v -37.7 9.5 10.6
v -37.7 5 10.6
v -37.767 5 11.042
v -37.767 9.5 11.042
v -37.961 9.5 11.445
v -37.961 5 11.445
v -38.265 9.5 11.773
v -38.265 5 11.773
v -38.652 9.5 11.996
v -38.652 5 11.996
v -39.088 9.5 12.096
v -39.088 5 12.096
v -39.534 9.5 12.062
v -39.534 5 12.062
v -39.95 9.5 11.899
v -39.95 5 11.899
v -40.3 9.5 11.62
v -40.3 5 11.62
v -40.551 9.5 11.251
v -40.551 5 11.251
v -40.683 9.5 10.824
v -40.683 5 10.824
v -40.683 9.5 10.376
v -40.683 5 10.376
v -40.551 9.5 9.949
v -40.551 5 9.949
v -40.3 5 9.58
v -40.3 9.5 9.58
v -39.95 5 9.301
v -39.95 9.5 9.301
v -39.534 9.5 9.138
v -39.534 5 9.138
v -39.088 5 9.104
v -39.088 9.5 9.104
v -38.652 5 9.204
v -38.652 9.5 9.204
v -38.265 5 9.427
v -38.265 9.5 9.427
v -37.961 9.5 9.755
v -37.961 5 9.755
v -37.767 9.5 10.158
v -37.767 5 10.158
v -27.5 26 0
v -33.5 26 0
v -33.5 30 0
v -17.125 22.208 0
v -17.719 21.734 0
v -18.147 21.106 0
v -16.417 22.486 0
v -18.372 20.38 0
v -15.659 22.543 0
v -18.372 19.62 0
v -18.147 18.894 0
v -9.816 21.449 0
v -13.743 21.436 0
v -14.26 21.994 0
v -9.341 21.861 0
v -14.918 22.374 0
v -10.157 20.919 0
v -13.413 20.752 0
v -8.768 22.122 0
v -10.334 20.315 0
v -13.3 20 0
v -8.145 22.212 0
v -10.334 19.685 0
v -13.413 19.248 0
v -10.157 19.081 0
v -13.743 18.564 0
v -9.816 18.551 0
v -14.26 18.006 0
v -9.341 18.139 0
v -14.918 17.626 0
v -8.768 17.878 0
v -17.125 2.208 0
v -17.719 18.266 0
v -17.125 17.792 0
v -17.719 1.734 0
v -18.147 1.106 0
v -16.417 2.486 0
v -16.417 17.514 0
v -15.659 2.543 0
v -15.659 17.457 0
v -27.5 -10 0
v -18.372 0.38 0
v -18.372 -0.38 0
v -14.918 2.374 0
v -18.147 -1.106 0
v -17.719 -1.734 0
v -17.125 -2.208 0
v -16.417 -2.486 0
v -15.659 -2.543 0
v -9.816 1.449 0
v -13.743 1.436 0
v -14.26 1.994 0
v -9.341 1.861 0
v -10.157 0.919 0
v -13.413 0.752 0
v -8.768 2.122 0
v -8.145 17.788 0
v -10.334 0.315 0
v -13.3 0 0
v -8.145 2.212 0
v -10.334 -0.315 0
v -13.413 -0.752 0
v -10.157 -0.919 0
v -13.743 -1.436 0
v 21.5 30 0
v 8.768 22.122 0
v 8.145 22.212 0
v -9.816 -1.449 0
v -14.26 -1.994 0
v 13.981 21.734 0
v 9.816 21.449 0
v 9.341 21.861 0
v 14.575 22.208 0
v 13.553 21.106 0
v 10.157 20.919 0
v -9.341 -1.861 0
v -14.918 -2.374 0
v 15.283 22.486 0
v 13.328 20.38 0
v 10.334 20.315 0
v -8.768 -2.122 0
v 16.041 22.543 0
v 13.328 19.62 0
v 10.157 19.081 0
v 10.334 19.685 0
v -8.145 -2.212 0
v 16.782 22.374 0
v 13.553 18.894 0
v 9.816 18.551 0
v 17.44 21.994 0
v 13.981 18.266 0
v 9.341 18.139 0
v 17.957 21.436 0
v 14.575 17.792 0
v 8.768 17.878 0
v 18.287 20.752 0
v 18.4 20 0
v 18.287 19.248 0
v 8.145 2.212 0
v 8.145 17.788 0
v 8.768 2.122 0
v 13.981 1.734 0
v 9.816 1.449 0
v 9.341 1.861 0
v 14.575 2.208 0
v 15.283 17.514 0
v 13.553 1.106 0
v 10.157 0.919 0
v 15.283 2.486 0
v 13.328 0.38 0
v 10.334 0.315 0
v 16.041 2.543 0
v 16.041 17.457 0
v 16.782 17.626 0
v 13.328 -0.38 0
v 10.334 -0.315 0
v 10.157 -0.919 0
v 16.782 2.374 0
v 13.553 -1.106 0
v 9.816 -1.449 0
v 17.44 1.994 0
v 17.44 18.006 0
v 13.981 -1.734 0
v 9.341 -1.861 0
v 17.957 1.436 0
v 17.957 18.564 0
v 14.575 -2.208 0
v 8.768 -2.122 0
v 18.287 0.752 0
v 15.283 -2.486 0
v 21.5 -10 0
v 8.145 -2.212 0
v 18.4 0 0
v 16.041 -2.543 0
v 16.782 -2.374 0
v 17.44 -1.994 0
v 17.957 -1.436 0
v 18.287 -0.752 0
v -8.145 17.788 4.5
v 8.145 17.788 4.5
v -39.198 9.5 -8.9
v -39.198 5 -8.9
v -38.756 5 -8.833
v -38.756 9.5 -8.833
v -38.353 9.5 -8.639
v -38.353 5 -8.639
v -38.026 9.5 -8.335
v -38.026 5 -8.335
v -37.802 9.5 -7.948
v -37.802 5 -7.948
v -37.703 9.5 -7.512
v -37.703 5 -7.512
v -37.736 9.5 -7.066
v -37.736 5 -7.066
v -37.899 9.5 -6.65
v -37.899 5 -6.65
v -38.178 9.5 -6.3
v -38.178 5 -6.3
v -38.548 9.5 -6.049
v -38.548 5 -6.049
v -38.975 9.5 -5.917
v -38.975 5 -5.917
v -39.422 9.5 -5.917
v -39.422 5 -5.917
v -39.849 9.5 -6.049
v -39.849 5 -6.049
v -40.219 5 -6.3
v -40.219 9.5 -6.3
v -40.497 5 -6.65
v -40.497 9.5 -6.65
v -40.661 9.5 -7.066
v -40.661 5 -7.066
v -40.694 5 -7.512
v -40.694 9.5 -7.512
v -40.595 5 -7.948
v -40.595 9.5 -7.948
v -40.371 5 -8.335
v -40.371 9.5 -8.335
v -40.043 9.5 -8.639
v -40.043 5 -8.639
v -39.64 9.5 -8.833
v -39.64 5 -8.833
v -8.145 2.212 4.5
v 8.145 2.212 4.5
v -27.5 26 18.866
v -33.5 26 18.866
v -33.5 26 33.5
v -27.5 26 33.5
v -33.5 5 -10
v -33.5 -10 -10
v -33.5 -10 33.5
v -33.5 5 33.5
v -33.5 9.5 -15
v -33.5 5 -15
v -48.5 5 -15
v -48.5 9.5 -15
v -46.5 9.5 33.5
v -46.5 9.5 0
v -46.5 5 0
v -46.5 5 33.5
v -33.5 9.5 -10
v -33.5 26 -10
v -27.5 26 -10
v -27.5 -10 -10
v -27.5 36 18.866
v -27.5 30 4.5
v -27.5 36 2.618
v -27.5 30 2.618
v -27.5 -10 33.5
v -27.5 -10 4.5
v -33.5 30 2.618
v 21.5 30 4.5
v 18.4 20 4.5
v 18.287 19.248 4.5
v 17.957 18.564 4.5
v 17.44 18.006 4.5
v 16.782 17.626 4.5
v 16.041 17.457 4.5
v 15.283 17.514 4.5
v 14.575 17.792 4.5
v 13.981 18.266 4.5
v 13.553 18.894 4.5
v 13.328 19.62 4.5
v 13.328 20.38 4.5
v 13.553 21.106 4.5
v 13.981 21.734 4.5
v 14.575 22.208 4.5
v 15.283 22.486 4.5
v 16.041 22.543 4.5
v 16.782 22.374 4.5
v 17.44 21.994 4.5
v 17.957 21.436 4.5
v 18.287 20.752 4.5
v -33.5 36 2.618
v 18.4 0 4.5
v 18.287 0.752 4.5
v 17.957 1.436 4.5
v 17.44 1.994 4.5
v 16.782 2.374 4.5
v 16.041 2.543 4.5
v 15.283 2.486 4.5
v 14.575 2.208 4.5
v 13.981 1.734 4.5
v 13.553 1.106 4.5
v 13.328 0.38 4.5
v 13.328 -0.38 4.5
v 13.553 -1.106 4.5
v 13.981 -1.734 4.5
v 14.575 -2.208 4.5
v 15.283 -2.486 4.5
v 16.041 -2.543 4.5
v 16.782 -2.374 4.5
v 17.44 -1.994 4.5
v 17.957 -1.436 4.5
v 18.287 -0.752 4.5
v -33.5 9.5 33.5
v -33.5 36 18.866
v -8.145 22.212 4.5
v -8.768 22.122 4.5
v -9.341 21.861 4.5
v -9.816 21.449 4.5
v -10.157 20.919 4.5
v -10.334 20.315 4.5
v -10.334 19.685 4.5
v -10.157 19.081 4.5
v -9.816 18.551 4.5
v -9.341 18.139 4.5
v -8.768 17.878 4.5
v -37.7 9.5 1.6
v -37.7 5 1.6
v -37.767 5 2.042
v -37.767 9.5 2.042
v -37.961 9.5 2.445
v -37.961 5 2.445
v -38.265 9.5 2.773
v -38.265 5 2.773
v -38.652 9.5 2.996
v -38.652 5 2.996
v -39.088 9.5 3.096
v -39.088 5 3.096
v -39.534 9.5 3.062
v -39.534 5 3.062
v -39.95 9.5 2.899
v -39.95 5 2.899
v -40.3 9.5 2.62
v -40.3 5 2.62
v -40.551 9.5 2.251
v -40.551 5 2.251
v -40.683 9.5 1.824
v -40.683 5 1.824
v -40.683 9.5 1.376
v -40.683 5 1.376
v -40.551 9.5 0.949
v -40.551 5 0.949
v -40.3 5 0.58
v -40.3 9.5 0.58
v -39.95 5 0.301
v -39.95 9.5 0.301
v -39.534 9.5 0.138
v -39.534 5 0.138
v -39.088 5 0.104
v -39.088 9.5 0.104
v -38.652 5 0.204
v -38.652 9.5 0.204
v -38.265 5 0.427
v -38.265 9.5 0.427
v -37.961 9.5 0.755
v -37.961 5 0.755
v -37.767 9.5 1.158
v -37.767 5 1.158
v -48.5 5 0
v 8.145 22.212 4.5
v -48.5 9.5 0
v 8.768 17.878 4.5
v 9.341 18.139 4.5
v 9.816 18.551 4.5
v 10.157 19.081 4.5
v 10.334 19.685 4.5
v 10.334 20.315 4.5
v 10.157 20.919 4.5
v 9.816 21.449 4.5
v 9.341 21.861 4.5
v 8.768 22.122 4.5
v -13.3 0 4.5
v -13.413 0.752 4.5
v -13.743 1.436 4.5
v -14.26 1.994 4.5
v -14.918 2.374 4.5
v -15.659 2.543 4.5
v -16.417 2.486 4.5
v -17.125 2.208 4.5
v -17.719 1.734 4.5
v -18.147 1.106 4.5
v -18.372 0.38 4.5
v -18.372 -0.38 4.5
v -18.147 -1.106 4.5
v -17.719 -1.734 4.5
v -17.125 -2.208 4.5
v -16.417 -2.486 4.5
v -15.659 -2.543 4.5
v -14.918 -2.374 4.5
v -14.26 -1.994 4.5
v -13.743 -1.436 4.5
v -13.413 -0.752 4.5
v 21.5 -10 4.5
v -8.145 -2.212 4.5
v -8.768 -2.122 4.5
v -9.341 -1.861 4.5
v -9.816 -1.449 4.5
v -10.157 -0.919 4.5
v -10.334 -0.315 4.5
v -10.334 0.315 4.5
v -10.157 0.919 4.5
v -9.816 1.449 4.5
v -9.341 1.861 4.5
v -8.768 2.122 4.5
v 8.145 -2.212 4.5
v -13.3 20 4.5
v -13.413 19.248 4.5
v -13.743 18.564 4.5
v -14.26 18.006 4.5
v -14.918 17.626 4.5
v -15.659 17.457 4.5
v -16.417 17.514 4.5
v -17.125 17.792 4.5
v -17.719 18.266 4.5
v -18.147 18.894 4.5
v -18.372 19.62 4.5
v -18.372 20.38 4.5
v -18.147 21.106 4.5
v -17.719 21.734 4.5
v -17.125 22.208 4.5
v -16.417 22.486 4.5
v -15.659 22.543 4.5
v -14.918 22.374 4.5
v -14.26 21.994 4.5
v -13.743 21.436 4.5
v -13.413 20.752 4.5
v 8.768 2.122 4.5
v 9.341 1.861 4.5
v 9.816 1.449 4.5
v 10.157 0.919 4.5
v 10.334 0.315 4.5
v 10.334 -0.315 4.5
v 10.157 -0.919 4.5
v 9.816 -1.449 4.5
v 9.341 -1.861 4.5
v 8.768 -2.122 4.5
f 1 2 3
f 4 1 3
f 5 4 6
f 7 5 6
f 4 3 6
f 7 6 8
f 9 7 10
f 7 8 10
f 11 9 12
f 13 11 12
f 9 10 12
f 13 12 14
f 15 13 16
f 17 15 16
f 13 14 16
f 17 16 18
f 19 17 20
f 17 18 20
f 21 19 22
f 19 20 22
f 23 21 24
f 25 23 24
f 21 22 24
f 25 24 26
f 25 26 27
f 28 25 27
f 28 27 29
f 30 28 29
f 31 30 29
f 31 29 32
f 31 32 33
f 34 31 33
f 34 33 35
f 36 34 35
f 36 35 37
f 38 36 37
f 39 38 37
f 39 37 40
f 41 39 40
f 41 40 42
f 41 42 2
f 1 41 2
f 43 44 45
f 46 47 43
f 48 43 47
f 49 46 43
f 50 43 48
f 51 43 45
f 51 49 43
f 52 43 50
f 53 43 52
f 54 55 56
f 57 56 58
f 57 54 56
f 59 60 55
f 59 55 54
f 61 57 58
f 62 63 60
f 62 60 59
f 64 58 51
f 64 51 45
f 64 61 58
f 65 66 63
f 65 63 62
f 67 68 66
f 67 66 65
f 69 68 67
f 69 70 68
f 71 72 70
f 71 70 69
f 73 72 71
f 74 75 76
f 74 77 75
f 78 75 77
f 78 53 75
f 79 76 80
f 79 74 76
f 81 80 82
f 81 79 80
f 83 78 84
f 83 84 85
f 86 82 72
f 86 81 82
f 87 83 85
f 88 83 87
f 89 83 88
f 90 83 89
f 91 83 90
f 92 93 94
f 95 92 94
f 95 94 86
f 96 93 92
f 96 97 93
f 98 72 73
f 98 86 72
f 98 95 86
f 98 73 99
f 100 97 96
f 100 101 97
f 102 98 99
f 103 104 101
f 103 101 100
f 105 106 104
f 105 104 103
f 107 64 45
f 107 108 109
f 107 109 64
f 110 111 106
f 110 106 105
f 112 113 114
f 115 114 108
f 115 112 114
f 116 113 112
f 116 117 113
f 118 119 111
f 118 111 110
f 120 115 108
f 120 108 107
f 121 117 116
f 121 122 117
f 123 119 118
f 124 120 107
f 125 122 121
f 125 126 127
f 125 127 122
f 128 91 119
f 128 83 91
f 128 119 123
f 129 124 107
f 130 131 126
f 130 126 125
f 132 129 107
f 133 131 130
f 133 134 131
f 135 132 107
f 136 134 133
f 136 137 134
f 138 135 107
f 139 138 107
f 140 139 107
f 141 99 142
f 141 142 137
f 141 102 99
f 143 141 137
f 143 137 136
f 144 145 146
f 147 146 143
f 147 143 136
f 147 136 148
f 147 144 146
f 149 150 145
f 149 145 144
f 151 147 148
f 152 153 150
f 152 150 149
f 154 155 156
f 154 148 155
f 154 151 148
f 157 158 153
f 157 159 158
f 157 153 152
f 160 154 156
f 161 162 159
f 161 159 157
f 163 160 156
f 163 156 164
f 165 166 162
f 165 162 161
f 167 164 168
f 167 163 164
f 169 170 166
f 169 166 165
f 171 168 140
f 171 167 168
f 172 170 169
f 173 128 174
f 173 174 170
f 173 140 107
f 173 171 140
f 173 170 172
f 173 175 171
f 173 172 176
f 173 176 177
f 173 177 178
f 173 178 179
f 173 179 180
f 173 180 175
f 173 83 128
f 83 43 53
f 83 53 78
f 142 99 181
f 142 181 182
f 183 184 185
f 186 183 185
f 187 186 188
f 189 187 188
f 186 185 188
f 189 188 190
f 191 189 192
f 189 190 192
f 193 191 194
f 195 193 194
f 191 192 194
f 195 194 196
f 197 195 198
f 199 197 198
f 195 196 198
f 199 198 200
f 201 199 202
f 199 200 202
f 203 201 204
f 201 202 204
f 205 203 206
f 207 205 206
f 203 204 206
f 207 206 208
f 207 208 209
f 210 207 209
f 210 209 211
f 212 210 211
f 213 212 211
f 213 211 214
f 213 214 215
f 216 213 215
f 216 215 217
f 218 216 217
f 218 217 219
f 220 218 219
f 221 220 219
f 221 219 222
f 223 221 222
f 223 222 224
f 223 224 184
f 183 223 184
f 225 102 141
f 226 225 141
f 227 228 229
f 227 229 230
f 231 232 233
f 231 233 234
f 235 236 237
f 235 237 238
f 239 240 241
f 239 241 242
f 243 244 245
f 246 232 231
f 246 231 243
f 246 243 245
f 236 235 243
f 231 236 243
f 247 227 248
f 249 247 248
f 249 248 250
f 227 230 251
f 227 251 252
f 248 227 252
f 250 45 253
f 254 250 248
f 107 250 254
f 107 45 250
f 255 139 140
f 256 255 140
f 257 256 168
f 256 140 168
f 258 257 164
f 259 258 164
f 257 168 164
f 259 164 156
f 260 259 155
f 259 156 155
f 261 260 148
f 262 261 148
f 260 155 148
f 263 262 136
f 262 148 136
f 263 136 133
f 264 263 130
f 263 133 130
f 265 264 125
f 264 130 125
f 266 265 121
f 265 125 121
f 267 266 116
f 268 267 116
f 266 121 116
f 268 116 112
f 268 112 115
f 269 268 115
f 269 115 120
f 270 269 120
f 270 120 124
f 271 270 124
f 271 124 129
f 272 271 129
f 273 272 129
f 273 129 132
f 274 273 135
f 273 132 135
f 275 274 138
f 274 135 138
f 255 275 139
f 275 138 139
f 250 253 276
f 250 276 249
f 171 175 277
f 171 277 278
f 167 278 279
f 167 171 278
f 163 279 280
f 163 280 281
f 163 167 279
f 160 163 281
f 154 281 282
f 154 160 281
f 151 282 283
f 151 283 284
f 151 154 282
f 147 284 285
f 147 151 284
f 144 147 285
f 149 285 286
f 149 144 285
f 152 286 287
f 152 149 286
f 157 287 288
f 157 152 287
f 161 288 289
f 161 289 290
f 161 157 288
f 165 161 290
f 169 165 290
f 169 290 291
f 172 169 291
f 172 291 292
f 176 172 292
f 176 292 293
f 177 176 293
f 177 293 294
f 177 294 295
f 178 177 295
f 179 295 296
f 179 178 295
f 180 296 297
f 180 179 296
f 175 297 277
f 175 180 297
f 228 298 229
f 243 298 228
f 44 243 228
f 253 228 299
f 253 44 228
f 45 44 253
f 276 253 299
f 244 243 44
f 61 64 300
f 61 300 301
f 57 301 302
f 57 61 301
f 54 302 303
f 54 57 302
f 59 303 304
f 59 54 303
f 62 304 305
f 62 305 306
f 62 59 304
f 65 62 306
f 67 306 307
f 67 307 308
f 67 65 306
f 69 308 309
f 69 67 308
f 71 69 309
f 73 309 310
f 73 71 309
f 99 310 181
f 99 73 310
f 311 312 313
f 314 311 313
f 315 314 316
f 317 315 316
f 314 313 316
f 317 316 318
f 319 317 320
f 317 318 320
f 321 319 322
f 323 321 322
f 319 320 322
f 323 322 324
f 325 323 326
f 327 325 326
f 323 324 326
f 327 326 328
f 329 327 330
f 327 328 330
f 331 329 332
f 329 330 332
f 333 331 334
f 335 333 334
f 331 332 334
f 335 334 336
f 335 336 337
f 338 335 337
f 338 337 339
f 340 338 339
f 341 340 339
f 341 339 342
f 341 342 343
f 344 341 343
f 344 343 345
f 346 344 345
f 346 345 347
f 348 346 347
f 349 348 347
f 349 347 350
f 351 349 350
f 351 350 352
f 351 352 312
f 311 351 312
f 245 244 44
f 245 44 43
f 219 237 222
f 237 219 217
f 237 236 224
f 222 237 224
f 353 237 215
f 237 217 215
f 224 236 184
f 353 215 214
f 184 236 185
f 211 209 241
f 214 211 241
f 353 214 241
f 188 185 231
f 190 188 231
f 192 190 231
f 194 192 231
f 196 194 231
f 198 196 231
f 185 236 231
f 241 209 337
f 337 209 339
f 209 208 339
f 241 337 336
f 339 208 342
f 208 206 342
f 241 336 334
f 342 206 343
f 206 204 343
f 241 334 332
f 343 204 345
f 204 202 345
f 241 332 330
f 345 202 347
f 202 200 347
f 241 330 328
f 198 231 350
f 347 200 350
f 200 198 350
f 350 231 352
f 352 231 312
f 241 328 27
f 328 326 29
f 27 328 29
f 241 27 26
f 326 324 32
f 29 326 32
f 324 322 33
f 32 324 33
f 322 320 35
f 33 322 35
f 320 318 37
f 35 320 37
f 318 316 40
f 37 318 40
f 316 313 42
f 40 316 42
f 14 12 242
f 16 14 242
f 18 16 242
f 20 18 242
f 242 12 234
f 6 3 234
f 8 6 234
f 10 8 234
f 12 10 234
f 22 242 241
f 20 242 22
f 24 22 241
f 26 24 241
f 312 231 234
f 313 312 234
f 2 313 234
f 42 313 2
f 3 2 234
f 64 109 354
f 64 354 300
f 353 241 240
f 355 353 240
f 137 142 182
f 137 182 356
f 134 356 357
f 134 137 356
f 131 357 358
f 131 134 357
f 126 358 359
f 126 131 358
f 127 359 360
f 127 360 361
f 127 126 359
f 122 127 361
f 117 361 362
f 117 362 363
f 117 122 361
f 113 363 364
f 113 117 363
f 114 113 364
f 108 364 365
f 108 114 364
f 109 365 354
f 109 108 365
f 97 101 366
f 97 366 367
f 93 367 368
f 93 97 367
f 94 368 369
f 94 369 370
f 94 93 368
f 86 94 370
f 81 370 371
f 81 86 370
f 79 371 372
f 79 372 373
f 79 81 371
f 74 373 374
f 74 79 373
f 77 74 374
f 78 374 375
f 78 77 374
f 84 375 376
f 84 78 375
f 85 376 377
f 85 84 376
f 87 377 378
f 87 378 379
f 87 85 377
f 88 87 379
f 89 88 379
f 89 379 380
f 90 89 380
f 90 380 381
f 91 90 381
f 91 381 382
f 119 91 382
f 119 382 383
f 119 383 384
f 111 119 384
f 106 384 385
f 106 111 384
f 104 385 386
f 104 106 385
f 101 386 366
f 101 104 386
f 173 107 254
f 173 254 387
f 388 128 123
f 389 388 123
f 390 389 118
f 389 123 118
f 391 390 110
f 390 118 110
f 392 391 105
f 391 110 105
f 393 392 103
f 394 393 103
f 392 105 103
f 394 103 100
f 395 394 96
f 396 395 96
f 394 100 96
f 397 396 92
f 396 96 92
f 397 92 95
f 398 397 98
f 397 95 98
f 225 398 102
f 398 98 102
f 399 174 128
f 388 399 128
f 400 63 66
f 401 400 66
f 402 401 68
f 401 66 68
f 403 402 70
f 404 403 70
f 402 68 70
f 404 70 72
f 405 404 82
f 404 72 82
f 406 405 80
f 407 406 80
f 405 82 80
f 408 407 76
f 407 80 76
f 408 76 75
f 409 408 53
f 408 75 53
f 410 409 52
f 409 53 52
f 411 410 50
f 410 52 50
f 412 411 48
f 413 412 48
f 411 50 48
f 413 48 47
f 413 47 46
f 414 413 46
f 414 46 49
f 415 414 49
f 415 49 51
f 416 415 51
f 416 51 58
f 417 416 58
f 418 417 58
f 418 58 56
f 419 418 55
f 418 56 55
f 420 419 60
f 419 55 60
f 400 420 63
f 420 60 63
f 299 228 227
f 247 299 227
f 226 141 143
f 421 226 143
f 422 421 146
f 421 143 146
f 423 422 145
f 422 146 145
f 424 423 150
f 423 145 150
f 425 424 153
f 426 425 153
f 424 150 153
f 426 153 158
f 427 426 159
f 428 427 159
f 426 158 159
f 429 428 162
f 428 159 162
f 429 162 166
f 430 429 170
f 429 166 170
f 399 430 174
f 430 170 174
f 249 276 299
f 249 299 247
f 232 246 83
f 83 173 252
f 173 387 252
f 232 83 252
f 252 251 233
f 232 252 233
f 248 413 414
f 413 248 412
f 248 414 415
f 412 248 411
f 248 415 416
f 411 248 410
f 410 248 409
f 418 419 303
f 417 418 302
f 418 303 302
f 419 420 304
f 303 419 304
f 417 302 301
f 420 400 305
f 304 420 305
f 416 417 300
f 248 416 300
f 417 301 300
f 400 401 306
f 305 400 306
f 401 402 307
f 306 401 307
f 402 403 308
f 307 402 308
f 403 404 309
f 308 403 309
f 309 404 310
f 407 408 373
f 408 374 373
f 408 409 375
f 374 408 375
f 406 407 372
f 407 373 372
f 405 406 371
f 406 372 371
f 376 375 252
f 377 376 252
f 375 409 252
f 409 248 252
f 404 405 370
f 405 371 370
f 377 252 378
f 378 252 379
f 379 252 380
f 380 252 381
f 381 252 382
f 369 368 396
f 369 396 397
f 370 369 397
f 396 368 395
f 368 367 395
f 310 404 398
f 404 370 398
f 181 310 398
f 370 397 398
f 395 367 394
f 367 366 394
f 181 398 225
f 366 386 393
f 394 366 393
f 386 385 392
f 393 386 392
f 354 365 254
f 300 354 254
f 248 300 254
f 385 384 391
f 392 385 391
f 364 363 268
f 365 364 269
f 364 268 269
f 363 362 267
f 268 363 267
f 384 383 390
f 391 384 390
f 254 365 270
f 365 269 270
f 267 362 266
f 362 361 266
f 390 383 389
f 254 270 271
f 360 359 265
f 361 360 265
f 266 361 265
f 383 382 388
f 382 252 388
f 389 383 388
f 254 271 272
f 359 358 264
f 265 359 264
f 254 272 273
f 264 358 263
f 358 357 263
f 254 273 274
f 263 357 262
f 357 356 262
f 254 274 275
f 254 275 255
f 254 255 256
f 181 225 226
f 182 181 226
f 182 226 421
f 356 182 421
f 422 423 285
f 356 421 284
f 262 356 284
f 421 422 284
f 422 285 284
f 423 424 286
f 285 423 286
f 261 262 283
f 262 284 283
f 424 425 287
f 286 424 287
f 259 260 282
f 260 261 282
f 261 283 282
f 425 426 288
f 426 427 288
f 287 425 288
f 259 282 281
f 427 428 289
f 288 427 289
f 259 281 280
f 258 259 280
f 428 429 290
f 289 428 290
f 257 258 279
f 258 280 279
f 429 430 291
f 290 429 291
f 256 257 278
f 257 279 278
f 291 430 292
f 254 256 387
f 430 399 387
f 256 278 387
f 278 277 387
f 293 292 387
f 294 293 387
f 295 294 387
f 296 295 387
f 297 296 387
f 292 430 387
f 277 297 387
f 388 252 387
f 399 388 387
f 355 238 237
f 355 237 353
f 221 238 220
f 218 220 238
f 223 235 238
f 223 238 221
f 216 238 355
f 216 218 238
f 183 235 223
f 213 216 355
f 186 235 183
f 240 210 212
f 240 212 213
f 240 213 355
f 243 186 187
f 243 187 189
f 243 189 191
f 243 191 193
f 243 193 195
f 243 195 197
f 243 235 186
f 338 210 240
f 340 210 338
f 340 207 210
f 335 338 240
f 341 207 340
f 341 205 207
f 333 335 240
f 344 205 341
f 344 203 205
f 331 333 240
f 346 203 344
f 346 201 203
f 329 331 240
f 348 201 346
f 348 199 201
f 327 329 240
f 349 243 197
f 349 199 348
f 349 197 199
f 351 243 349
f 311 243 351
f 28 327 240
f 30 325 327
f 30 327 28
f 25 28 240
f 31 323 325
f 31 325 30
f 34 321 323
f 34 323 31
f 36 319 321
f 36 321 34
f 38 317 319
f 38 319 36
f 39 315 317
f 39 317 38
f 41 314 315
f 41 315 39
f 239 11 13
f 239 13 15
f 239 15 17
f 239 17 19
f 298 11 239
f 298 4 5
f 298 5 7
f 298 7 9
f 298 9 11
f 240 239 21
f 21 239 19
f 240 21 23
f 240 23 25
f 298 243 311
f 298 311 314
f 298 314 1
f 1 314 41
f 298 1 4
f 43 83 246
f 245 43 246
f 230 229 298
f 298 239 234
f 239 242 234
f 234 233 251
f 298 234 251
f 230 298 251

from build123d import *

# Parameters (mm, degrees)
SKETCH_1_R          = 2.55
EXTRUDE_1_DEPTH     = 4.5
SKETCH_2_W          = 6
SKETCH_2_H          = 20
EXTRUDE_2_DEPTH     = 29
SKETCH_5_W          = 33.5
SKETCH_5_H          = 4.5
EXTRUDE_4_DEPTH     = 13
SKETCH_6_R          = 1.5
CUT_EXTRUDE_1_DEPTH = 13
SKETCH_8_W          = 6
SKETCH_8_H          = 20
EXTRUDE_5_DEPTH     = 10
SKETCH_11_W         = 6
SKETCH_11_H         = 43.5
EXTRUDE_7_DEPTH     = 30
SKETCH_17_W         = 6
SKETCH_17_H         = 43.5
CUT_EXTRUDE_3_DEPTH = 14
SKETCH_18_W         = 6
SKETCH_18_H         = 16.247997213
EXTRUDE_12_DEPTH    = 10
SKETCH_20_W         = 15
SKETCH_20_H         = 4.5
EXTRUDE_13_DEPTH    = 15
SKETCH_22_R         = 1.5
CUT_EXTRUDE_5_DEPTH = 15
SKETCH_23_W         = 13
SKETCH_23_H         = 33.5
CUT_EXTRUDE_6_DEPTH = 15
SKETCH_24_R         = 1.5
CUT_EXTRUDE_7_DEPTH = 15


with BuildPart() as part:
    # 草图1 → 凸台-拉伸1 (new body)
    with BuildSketch(Plane.XY):
        Polygon((-27.5, -10), (21.5, -10), (21.5, 10), (-27.5, 10), (-33.5, 10), (-33.5, -10), align=None)
        with Locations((-15.85, 0)):
            Circle(SKETCH_1_R, mode=Mode.SUBTRACT)
        with Locations((15.85, 0)):
            Circle(SKETCH_1_R, mode=Mode.SUBTRACT)
        with BuildLine():
            Line((-8.144701861, 2.212014563), (8.144701861, 2.212014563))
            ThreePointArc((8.144701861, 2.212014563), (10.356716424, 0), (8.144701861, -2.212014563))
            Line((8.144701861, -2.212014563), (-8.144701861, -2.212014563))
            ThreePointArc((-8.144701861, -2.212014563), (-10.356716424, 0), (-8.144701861, 2.212014563))
        make_face(mode=Mode.SUBTRACT)
    extrude_1 = extrude(amount=EXTRUDE_1_DEPTH)

    # 草图2 → 凸台-拉伸2 (add)
    with BuildSketch(Plane.XY.offset(4.5)):
        with Locations((-30.5, 0)):
            Rectangle(SKETCH_2_W, SKETCH_2_H)
    extrude(amount=EXTRUDE_2_DEPTH)

    # 草图5 → 凸台-拉伸4 (add)
    with BuildSketch(Plane.ZY.offset(33.5)):
        with Locations((16.75, -7.75)):
            Rectangle(SKETCH_5_W, SKETCH_5_H)
        with Locations((16.75, 7.25)):
            Rectangle(SKETCH_5_W, SKETCH_5_H)
    extrude(amount=EXTRUDE_4_DEPTH)

    # 草图6 → 切除-拉伸1 (cut)
    with BuildSketch(Plane.XZ.offset(10)):
        with Locations((-39.2, 1.6)):
            Circle(SKETCH_6_R)
        with Locations((-39.2, 10.6)):
            Circle(SKETCH_6_R)
    extrude(amount=-CUT_EXTRUDE_1_DEPTH, mode=Mode.SUBTRACT)

    # 草图8 → 凸台-拉伸5 (add)
    with BuildSketch(Plane(origin=(0, 0, 0), x_dir=(-1, 0, 0), z_dir=(0, 0, -1))):
        with Locations((30.5, 0)):
            Rectangle(SKETCH_8_W, SKETCH_8_H)
    extrude(amount=EXTRUDE_5_DEPTH)

    # 草图11 → 凸台-拉伸7 (add)
    with BuildSketch(Plane(origin=(0, 10, 0), x_dir=(1, 0, 0), z_dir=(0, 1, 0))):
        with Locations((-30.5, -11.75)):
            Rectangle(SKETCH_11_W, SKETCH_11_H)
    extrude(amount=EXTRUDE_7_DEPTH)

    # 草图17 → 切除-拉伸3 (cut)
    with BuildSketch(Plane(origin=(0, 40, 0), x_dir=(1, 0, 0), z_dir=(0, 1, 0))):
        with Locations((-30.5, -11.75)):
            Rectangle(SKETCH_17_W, SKETCH_17_H)
    extrude(amount=-CUT_EXTRUDE_3_DEPTH, mode=Mode.SUBTRACT)

    # 草图18 → 凸台-拉伸12 (add)
    with BuildSketch(Plane(origin=(0, 26, 0), x_dir=(1, 0, 0), z_dir=(0, 1, 0))):
        with Locations((-30.5, -10.74216301)):
            Rectangle(SKETCH_18_W, SKETCH_18_H)
    extrude(amount=EXTRUDE_12_DEPTH)

    # 镜向1: 凸台-拉伸1 across plane
    add(extrude_1.mirror(Plane.ZX.offset(10)))

    # 草图20 → 凸台-拉伸13 (add)
    with BuildSketch(Plane.ZY.offset(33.5)):
        with Locations((-7.5, 7.25)):
            Rectangle(SKETCH_20_W, SKETCH_20_H)
    extrude(amount=EXTRUDE_13_DEPTH)

    # 草图22 → 切除-拉伸5 (cut)
    with BuildSketch(Plane.XZ.offset(-5)):
        with Locations((-39.2, 10.6)):
            Circle(SKETCH_22_R)
        with Locations((-39.2, 1.6)):
            Circle(SKETCH_22_R)
    extrude(amount=-CUT_EXTRUDE_5_DEPTH, mode=Mode.SUBTRACT)

    # 草图23 → 切除-拉伸6 (cut)
    with BuildSketch(Plane.XZ.offset(10)):
        with Locations((-40, 16.75)):
            Rectangle(SKETCH_23_W, SKETCH_23_H)
    extrude(amount=-CUT_EXTRUDE_6_DEPTH, mode=Mode.SUBTRACT)

    # 草图24 → 切除-拉伸7 (cut)
    with BuildSketch(Plane.XZ.offset(-5)):
        with Locations(Location((-39.19836294, -7.4, 0), (0, 0, 270))):
            Circle(SKETCH_24_R)
    extrude(amount=-CUT_EXTRUDE_7_DEPTH, mode=Mode.SUBTRACT)


solid = part.part
